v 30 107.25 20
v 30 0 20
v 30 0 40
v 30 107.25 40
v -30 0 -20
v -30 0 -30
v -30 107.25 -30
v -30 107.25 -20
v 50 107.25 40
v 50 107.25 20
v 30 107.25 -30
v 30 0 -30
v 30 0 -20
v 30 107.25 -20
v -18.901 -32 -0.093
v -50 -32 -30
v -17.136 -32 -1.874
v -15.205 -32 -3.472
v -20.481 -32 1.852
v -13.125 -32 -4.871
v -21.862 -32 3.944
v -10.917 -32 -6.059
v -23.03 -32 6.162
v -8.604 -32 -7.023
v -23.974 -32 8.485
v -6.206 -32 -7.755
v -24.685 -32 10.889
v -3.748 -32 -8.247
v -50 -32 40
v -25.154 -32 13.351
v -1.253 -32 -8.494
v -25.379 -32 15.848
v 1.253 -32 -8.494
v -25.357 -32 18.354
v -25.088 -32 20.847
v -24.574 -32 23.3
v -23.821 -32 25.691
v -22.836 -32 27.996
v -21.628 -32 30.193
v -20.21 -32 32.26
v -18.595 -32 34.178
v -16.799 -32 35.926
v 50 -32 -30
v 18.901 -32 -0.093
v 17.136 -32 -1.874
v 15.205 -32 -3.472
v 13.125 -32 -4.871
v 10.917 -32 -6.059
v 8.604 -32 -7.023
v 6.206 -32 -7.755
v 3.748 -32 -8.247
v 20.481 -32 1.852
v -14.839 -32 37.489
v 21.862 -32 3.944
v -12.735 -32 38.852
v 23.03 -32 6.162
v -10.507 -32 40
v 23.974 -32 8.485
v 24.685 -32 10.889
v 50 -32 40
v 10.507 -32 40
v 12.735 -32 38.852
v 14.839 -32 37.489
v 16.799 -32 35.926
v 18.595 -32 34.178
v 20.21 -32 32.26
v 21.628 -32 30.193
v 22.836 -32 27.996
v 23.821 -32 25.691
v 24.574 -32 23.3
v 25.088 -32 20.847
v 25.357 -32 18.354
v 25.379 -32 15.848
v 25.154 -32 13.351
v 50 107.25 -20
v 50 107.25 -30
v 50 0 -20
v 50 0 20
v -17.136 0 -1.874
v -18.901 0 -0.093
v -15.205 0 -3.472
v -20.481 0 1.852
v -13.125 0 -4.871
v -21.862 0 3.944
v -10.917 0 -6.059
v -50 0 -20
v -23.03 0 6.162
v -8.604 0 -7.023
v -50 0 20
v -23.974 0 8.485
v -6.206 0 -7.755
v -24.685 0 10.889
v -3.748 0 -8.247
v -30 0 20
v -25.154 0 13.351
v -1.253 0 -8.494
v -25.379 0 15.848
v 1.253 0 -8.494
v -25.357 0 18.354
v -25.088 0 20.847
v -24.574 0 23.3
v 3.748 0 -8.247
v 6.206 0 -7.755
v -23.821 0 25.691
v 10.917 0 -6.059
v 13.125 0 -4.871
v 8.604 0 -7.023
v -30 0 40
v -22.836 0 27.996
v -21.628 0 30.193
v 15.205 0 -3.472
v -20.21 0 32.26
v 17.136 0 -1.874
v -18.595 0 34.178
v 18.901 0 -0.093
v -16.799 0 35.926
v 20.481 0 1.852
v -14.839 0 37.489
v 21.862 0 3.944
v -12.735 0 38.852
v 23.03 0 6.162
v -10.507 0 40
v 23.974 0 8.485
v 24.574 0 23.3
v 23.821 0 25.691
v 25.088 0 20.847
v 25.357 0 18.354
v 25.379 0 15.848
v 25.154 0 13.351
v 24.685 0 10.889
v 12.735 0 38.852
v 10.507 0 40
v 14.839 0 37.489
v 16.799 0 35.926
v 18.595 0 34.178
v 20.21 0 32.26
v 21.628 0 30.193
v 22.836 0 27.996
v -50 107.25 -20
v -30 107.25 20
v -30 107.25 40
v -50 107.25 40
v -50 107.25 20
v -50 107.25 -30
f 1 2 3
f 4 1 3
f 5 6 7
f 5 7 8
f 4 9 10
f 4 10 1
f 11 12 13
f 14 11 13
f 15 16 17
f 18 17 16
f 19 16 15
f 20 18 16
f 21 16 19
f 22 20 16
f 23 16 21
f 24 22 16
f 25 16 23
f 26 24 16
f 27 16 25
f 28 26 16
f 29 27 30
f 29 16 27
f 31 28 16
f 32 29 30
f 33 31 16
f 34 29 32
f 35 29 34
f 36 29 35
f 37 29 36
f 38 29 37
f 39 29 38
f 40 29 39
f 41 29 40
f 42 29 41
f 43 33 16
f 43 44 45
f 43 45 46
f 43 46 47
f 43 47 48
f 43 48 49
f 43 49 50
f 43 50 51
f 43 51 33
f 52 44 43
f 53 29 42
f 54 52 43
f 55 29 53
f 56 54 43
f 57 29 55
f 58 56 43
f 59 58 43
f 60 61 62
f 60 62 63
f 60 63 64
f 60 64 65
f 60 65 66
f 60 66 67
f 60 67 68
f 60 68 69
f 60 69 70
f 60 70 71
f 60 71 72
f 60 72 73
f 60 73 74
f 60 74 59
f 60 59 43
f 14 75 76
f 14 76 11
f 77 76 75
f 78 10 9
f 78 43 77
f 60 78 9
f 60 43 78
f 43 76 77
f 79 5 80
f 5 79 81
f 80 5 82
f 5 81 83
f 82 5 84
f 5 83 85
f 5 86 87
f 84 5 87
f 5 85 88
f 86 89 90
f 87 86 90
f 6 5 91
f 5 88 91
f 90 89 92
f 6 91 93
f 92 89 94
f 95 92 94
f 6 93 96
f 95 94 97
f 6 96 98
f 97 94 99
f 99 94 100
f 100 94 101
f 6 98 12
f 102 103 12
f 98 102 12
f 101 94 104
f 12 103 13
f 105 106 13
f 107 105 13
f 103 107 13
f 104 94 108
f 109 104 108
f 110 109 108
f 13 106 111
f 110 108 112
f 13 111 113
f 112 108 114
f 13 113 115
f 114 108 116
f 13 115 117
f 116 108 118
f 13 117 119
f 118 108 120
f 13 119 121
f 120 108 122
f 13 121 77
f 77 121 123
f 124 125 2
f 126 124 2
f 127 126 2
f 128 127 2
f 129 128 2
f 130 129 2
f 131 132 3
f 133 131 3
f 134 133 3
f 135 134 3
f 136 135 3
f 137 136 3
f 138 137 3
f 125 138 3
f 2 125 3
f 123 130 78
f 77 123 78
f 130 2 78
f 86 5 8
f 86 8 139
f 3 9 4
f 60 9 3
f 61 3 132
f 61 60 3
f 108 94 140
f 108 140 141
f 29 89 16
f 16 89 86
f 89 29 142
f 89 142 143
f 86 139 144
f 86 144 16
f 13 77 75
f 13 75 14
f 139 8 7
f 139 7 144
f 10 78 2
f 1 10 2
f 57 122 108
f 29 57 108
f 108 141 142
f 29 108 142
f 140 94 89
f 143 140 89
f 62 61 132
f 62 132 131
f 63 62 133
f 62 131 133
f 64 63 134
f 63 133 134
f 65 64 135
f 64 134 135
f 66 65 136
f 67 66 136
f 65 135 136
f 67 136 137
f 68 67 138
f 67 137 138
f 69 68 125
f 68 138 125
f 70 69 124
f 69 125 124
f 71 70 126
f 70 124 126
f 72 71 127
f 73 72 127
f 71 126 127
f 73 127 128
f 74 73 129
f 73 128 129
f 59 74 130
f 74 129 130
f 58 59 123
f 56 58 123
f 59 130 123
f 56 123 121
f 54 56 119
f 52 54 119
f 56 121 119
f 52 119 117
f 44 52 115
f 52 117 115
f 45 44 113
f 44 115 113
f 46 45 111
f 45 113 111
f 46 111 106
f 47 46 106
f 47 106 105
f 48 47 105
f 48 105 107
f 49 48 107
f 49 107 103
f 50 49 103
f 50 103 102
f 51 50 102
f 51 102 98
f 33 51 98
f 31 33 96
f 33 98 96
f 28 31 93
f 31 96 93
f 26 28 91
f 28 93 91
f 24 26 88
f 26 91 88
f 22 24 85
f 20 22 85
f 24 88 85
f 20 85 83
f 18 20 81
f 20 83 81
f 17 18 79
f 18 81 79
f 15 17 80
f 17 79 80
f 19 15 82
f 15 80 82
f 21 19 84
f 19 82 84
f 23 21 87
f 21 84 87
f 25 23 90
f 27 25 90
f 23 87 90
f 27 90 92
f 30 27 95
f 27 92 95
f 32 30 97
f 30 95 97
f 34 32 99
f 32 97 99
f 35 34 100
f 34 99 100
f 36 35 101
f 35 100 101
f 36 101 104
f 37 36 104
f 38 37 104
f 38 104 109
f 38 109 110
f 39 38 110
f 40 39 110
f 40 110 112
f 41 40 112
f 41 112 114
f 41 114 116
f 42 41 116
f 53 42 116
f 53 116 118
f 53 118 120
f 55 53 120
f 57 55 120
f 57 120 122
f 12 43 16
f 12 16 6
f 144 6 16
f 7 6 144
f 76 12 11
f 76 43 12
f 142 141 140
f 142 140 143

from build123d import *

# Parameters (mm, degrees)
F1_DEPTH = 32
F2_W     = 20
F2_H     = 20
F3_DEPTH = 107.25
F4_W     = 139.25
F4_H     = 10
F5_DEPTH = 150


with BuildPart() as f1:
    # F0 (on Front) → F1 (new body)
    with BuildSketch(Plane.XZ):
        with BuildLine():
            Line((50, -40), (50, 40))
            Line((50, 40), (10.506873, 40))
            ThreePointArc((10.506873, 40), (0, -8.525), (-10.506873, 40))
            Line((-10.506873, 40), (-50, 40))
            Line((-50, 40), (-50, -40))
            Line((-50, -40), (50, -40))
        make_face()
    extrude(amount=F1_DEPTH)

    # F2 (on face) → F3 (join)
    with BuildSketch(Plane(origin=(0, 0, 0), x_dir=(-1, 0, 0), z_dir=(0, 1, 0))):
        with Locations((-40, 30)):
            Rectangle(F2_W, F2_H)
        with Locations((40, 30)):
            Rectangle(F2_W, F2_H)
        with Locations((40, -30)):
            Rectangle(F2_W, F2_H)
        with Locations((-40, -30)):
            Rectangle(F2_W, F2_H)
    extrude(amount=F3_DEPTH)

    # F4 (on face) → F5 (cut)
    with BuildSketch(Plane.YZ.offset(50)):
        with Locations((37.625, -35)):
            Rectangle(F4_W, F4_H)
    extrude(amount=-F5_DEPTH, mode=Mode.SUBTRACT)


solid = f1.part
